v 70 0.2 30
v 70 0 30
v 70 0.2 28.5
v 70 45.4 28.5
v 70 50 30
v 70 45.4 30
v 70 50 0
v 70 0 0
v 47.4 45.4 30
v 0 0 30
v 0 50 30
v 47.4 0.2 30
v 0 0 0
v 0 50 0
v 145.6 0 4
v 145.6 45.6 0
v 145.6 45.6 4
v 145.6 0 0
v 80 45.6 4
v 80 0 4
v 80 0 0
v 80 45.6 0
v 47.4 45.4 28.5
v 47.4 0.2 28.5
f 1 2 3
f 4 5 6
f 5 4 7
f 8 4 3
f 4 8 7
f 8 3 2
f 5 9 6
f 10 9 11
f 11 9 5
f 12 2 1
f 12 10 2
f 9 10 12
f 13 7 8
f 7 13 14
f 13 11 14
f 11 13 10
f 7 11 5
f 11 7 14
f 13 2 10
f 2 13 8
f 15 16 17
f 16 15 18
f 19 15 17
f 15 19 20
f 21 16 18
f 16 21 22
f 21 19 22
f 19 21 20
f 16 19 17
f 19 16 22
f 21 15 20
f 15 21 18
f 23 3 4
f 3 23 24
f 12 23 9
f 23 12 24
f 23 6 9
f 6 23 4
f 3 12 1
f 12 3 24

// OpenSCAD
// Two-part enclosure for a small electronics board (e.g. Arduino-based logger)
// Print orientation: box standing on the bed, lid plate flat on the bed.

// ---------------- Parameters ----------------
box_x      = 70;    // box outer size in X
box_y      = 50;    // box outer size in Y
box_z      = 30;    // box outer size in Z
box_wall   = 2;     // box wall thickness
box_floor  = 2;     // box floor thickness

lip_t      = 1.5;   // lid lip wall thickness
lip_h      = 4;     // lid lip height
lip_x      = 65.6;  // lip outer size in X
lip_y      = 45.6;  // lip outer size in Y
lip_over   = 0.2;   // clearance between lip inner edge and box opening (each side)

gap        = 10;    // gap between the two parts on the bed

eps        = 0.5;   // cutter overshoot

$fn = 64;

// ---------------- Derived ----------------
box_inner_x = box_x - 2*box_wall;
box_inner_y = box_y - 2*box_wall;
lip_inner_x = lip_x - 2*lip_over;
lip_inner_y = lip_y - 2*lip_over;

// ---------------- Model ----------------
difference() {
    union() {
        // Part 1: box
        cube([box_x, box_y, box_z]);

        // Part 2: lid plate with lip
        translate([box_x + gap, 0, 0])
            cube([lip_x, lip_y, lip_h]);
    }

    // Lid lip sunk into the top of the box (open-top box)
    translate([box_x + gap - lip_inner_x/2,
               lip_y/2 - lip_inner_y/2,
               box_z - lip_t])
        cube([lip_inner_x, lip_inner_y, lip_h]);
}
